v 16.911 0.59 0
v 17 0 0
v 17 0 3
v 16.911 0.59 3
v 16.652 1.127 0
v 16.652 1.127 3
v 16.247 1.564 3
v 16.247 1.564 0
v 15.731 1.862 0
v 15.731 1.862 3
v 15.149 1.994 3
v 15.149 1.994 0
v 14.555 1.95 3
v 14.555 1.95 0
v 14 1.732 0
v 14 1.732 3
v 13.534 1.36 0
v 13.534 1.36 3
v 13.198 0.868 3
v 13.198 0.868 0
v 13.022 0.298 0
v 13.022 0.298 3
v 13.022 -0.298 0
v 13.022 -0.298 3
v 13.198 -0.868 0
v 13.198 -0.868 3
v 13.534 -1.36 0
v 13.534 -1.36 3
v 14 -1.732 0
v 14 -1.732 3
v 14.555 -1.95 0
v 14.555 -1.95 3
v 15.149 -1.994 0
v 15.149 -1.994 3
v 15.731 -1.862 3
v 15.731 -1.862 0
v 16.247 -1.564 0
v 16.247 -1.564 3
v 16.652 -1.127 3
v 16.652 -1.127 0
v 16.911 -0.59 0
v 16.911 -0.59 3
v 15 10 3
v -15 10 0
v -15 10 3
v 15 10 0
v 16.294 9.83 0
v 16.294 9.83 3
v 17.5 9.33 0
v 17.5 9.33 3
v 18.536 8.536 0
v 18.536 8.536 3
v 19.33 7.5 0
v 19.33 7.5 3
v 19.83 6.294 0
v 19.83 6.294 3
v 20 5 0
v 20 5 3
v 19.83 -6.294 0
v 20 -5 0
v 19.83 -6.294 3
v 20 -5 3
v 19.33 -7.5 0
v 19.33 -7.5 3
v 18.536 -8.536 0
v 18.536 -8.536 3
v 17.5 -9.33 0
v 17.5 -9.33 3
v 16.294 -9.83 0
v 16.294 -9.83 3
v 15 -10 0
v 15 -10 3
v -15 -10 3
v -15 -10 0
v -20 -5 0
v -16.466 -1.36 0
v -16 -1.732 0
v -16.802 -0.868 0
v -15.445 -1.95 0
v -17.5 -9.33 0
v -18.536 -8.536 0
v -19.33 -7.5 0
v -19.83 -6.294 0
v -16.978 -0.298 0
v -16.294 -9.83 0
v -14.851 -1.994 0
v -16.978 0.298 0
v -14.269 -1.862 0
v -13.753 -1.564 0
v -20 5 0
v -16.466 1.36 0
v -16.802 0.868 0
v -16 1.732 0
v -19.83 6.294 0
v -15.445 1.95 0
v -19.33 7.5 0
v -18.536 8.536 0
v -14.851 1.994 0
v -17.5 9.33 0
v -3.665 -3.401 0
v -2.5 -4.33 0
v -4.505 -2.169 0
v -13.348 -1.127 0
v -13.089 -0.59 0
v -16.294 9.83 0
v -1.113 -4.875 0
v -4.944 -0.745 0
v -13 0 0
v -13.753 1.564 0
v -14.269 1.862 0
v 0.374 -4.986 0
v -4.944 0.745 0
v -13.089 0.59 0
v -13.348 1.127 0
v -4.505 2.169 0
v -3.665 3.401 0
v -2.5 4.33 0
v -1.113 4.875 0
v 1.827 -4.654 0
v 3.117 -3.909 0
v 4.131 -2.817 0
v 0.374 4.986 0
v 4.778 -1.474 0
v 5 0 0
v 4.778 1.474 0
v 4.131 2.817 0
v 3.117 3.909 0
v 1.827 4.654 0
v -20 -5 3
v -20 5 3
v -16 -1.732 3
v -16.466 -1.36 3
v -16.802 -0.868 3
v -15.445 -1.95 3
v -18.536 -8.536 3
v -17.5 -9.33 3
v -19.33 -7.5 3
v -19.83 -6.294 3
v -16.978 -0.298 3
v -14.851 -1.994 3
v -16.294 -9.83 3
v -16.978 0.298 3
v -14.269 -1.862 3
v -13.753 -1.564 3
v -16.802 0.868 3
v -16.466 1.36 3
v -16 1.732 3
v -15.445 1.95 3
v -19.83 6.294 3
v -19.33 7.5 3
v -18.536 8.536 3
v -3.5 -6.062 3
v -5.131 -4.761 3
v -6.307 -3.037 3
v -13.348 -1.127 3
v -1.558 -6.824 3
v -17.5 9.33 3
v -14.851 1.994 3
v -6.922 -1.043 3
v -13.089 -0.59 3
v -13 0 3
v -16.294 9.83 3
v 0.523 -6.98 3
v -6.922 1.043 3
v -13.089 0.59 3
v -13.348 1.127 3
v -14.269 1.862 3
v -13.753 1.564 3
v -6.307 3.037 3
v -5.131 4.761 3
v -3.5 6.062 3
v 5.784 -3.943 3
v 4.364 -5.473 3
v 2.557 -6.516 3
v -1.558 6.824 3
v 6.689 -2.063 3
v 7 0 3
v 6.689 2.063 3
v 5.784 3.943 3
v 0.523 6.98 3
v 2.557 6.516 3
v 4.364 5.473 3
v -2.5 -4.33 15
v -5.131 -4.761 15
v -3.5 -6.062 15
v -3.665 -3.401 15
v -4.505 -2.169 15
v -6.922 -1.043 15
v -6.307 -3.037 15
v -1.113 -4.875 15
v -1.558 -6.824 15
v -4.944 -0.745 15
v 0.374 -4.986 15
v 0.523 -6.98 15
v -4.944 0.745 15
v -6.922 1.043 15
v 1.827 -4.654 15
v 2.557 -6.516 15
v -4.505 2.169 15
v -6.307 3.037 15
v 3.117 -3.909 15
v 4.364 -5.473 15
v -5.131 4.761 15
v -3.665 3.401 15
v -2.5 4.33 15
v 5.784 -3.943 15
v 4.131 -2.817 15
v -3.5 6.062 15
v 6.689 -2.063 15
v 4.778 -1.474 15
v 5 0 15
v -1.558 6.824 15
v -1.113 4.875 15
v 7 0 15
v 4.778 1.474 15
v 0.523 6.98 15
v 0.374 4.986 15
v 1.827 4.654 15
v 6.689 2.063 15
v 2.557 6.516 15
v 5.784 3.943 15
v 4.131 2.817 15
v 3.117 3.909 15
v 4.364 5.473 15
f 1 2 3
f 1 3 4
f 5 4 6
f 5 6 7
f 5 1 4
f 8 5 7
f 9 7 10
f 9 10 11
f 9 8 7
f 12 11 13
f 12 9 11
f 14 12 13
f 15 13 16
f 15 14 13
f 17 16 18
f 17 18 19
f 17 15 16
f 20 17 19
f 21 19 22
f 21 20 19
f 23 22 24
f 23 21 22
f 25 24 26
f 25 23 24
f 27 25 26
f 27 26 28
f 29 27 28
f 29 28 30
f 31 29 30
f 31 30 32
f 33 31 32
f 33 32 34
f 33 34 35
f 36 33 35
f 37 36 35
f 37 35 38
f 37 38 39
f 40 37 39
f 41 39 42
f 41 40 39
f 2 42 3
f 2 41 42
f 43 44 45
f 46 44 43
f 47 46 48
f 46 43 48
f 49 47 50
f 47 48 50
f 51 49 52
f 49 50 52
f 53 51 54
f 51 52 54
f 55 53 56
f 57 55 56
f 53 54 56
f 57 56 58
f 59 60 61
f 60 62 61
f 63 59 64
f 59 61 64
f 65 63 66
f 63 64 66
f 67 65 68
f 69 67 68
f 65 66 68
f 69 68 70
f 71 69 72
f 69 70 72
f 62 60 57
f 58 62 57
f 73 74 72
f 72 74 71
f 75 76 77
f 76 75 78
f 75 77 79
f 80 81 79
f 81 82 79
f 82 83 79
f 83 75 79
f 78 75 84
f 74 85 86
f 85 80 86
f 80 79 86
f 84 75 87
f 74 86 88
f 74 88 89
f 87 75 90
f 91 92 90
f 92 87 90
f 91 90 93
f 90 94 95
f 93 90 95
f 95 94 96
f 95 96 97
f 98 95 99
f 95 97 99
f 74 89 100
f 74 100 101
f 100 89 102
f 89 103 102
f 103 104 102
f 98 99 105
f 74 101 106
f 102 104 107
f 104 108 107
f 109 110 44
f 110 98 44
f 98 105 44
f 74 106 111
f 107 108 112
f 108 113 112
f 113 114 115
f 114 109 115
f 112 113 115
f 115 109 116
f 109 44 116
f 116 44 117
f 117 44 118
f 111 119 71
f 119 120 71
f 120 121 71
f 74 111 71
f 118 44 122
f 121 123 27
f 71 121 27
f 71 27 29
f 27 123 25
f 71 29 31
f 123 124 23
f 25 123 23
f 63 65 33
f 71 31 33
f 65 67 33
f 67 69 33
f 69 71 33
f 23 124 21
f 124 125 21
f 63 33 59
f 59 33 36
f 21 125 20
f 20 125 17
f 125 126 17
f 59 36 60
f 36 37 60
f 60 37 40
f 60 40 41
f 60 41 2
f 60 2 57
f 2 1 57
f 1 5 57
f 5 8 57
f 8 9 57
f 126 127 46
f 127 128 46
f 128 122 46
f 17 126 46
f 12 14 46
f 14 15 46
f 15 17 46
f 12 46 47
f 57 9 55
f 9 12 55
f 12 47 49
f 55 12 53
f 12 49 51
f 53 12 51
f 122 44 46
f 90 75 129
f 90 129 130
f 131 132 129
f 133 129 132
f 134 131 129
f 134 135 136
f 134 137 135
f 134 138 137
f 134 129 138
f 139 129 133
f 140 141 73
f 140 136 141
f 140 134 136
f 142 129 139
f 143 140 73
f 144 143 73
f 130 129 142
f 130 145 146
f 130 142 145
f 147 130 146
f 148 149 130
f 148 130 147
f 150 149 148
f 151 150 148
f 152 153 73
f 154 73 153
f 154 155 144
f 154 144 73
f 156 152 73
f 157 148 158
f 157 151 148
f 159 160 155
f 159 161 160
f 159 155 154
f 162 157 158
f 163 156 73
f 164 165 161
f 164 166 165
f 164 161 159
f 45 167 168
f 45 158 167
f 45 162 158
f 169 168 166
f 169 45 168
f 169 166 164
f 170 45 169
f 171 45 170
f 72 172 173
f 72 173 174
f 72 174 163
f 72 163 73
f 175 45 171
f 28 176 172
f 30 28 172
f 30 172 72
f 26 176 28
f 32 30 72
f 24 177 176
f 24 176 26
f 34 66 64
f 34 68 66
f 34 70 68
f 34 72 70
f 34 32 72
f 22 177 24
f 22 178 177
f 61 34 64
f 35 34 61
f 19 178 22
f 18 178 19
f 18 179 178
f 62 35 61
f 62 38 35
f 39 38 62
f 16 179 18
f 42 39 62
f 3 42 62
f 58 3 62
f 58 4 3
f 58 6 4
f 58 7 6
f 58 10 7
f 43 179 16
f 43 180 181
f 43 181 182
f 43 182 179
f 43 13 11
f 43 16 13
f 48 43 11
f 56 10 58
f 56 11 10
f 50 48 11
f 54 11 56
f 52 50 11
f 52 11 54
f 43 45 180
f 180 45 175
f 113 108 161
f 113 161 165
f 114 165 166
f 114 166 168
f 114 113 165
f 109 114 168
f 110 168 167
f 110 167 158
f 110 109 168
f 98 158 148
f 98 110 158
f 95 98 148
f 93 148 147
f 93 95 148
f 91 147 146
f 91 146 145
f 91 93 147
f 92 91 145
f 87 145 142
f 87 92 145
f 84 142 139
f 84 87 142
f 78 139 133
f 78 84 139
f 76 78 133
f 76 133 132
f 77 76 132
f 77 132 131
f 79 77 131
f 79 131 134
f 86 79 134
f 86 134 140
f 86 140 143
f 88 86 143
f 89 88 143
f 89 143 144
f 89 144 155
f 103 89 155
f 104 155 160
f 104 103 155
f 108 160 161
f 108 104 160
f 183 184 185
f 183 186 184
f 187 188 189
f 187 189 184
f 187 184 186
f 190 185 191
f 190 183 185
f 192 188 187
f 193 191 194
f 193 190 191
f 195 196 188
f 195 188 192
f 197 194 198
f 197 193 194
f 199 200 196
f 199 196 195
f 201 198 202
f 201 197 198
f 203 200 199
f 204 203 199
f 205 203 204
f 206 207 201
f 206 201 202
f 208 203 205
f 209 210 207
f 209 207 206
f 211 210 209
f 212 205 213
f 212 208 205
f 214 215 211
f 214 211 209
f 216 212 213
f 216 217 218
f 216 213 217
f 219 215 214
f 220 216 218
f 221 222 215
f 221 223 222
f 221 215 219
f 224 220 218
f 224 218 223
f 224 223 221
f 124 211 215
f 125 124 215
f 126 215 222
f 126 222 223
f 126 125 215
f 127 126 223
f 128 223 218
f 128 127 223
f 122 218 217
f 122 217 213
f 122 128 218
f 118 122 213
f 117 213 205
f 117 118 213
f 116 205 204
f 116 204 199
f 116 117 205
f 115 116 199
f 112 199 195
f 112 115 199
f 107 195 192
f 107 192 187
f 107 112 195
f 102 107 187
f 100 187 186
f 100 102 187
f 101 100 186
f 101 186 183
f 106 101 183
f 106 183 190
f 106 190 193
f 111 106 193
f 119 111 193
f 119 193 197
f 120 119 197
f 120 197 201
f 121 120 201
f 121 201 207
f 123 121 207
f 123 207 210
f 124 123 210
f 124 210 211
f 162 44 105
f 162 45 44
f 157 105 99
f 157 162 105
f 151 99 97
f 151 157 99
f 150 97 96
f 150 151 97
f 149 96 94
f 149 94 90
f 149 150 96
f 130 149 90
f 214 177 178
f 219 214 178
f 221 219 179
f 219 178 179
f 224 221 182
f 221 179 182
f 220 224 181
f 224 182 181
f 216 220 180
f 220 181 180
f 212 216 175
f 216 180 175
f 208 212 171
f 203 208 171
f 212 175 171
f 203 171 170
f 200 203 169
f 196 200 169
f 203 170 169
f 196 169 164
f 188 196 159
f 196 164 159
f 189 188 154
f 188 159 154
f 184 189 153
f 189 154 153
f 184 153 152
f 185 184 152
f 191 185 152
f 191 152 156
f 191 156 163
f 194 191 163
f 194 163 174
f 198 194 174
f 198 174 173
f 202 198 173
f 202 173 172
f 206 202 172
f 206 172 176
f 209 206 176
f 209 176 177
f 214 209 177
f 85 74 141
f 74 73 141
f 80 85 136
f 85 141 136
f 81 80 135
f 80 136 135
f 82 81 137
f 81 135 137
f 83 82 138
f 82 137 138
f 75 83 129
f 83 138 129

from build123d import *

# Parameters (mm, degrees)
F0_W     = 40
F0_H     = 20
F0_R     = 2
F0_R_2   = 7
F0_R_3   = 5
F1_DEPTH = 3
F2_DEPTH = 15
F3_R     = 5


with BuildPart() as f1:
    # F0 (on Top) → F1 (new body)
    with BuildSketch(Plane.XY):
        Rectangle(F0_W, F0_H)
        with Locations((-15, 0)):
            Circle(F0_R, mode=Mode.SUBTRACT)
        Circle(F0_R_2, mode=Mode.SUBTRACT)
        with Locations((15, 0)):
            Circle(F0_R, mode=Mode.SUBTRACT)
        Circle(F0_R_2)
        Circle(F0_R_3, mode=Mode.SUBTRACT)
    extrude(amount=F1_DEPTH)

    # F0 (on Top) → F2 (join)
    with BuildSketch(Plane.XY):
        Circle(F0_R_2)
        Circle(F0_R_3, mode=Mode.SUBTRACT)
    extrude(amount=F2_DEPTH)

    # F3
    f3_edges = [f1.edges().sort_by_distance(p)[0] for p in [
        (-20, 10, 1.5),
        (-20, -10, 1.5),
        (20, -10, 1.5),
        (20, 10, 1.5),
    ]]
    fillet(f3_edges, radius=F3_R)


solid = f1.part
